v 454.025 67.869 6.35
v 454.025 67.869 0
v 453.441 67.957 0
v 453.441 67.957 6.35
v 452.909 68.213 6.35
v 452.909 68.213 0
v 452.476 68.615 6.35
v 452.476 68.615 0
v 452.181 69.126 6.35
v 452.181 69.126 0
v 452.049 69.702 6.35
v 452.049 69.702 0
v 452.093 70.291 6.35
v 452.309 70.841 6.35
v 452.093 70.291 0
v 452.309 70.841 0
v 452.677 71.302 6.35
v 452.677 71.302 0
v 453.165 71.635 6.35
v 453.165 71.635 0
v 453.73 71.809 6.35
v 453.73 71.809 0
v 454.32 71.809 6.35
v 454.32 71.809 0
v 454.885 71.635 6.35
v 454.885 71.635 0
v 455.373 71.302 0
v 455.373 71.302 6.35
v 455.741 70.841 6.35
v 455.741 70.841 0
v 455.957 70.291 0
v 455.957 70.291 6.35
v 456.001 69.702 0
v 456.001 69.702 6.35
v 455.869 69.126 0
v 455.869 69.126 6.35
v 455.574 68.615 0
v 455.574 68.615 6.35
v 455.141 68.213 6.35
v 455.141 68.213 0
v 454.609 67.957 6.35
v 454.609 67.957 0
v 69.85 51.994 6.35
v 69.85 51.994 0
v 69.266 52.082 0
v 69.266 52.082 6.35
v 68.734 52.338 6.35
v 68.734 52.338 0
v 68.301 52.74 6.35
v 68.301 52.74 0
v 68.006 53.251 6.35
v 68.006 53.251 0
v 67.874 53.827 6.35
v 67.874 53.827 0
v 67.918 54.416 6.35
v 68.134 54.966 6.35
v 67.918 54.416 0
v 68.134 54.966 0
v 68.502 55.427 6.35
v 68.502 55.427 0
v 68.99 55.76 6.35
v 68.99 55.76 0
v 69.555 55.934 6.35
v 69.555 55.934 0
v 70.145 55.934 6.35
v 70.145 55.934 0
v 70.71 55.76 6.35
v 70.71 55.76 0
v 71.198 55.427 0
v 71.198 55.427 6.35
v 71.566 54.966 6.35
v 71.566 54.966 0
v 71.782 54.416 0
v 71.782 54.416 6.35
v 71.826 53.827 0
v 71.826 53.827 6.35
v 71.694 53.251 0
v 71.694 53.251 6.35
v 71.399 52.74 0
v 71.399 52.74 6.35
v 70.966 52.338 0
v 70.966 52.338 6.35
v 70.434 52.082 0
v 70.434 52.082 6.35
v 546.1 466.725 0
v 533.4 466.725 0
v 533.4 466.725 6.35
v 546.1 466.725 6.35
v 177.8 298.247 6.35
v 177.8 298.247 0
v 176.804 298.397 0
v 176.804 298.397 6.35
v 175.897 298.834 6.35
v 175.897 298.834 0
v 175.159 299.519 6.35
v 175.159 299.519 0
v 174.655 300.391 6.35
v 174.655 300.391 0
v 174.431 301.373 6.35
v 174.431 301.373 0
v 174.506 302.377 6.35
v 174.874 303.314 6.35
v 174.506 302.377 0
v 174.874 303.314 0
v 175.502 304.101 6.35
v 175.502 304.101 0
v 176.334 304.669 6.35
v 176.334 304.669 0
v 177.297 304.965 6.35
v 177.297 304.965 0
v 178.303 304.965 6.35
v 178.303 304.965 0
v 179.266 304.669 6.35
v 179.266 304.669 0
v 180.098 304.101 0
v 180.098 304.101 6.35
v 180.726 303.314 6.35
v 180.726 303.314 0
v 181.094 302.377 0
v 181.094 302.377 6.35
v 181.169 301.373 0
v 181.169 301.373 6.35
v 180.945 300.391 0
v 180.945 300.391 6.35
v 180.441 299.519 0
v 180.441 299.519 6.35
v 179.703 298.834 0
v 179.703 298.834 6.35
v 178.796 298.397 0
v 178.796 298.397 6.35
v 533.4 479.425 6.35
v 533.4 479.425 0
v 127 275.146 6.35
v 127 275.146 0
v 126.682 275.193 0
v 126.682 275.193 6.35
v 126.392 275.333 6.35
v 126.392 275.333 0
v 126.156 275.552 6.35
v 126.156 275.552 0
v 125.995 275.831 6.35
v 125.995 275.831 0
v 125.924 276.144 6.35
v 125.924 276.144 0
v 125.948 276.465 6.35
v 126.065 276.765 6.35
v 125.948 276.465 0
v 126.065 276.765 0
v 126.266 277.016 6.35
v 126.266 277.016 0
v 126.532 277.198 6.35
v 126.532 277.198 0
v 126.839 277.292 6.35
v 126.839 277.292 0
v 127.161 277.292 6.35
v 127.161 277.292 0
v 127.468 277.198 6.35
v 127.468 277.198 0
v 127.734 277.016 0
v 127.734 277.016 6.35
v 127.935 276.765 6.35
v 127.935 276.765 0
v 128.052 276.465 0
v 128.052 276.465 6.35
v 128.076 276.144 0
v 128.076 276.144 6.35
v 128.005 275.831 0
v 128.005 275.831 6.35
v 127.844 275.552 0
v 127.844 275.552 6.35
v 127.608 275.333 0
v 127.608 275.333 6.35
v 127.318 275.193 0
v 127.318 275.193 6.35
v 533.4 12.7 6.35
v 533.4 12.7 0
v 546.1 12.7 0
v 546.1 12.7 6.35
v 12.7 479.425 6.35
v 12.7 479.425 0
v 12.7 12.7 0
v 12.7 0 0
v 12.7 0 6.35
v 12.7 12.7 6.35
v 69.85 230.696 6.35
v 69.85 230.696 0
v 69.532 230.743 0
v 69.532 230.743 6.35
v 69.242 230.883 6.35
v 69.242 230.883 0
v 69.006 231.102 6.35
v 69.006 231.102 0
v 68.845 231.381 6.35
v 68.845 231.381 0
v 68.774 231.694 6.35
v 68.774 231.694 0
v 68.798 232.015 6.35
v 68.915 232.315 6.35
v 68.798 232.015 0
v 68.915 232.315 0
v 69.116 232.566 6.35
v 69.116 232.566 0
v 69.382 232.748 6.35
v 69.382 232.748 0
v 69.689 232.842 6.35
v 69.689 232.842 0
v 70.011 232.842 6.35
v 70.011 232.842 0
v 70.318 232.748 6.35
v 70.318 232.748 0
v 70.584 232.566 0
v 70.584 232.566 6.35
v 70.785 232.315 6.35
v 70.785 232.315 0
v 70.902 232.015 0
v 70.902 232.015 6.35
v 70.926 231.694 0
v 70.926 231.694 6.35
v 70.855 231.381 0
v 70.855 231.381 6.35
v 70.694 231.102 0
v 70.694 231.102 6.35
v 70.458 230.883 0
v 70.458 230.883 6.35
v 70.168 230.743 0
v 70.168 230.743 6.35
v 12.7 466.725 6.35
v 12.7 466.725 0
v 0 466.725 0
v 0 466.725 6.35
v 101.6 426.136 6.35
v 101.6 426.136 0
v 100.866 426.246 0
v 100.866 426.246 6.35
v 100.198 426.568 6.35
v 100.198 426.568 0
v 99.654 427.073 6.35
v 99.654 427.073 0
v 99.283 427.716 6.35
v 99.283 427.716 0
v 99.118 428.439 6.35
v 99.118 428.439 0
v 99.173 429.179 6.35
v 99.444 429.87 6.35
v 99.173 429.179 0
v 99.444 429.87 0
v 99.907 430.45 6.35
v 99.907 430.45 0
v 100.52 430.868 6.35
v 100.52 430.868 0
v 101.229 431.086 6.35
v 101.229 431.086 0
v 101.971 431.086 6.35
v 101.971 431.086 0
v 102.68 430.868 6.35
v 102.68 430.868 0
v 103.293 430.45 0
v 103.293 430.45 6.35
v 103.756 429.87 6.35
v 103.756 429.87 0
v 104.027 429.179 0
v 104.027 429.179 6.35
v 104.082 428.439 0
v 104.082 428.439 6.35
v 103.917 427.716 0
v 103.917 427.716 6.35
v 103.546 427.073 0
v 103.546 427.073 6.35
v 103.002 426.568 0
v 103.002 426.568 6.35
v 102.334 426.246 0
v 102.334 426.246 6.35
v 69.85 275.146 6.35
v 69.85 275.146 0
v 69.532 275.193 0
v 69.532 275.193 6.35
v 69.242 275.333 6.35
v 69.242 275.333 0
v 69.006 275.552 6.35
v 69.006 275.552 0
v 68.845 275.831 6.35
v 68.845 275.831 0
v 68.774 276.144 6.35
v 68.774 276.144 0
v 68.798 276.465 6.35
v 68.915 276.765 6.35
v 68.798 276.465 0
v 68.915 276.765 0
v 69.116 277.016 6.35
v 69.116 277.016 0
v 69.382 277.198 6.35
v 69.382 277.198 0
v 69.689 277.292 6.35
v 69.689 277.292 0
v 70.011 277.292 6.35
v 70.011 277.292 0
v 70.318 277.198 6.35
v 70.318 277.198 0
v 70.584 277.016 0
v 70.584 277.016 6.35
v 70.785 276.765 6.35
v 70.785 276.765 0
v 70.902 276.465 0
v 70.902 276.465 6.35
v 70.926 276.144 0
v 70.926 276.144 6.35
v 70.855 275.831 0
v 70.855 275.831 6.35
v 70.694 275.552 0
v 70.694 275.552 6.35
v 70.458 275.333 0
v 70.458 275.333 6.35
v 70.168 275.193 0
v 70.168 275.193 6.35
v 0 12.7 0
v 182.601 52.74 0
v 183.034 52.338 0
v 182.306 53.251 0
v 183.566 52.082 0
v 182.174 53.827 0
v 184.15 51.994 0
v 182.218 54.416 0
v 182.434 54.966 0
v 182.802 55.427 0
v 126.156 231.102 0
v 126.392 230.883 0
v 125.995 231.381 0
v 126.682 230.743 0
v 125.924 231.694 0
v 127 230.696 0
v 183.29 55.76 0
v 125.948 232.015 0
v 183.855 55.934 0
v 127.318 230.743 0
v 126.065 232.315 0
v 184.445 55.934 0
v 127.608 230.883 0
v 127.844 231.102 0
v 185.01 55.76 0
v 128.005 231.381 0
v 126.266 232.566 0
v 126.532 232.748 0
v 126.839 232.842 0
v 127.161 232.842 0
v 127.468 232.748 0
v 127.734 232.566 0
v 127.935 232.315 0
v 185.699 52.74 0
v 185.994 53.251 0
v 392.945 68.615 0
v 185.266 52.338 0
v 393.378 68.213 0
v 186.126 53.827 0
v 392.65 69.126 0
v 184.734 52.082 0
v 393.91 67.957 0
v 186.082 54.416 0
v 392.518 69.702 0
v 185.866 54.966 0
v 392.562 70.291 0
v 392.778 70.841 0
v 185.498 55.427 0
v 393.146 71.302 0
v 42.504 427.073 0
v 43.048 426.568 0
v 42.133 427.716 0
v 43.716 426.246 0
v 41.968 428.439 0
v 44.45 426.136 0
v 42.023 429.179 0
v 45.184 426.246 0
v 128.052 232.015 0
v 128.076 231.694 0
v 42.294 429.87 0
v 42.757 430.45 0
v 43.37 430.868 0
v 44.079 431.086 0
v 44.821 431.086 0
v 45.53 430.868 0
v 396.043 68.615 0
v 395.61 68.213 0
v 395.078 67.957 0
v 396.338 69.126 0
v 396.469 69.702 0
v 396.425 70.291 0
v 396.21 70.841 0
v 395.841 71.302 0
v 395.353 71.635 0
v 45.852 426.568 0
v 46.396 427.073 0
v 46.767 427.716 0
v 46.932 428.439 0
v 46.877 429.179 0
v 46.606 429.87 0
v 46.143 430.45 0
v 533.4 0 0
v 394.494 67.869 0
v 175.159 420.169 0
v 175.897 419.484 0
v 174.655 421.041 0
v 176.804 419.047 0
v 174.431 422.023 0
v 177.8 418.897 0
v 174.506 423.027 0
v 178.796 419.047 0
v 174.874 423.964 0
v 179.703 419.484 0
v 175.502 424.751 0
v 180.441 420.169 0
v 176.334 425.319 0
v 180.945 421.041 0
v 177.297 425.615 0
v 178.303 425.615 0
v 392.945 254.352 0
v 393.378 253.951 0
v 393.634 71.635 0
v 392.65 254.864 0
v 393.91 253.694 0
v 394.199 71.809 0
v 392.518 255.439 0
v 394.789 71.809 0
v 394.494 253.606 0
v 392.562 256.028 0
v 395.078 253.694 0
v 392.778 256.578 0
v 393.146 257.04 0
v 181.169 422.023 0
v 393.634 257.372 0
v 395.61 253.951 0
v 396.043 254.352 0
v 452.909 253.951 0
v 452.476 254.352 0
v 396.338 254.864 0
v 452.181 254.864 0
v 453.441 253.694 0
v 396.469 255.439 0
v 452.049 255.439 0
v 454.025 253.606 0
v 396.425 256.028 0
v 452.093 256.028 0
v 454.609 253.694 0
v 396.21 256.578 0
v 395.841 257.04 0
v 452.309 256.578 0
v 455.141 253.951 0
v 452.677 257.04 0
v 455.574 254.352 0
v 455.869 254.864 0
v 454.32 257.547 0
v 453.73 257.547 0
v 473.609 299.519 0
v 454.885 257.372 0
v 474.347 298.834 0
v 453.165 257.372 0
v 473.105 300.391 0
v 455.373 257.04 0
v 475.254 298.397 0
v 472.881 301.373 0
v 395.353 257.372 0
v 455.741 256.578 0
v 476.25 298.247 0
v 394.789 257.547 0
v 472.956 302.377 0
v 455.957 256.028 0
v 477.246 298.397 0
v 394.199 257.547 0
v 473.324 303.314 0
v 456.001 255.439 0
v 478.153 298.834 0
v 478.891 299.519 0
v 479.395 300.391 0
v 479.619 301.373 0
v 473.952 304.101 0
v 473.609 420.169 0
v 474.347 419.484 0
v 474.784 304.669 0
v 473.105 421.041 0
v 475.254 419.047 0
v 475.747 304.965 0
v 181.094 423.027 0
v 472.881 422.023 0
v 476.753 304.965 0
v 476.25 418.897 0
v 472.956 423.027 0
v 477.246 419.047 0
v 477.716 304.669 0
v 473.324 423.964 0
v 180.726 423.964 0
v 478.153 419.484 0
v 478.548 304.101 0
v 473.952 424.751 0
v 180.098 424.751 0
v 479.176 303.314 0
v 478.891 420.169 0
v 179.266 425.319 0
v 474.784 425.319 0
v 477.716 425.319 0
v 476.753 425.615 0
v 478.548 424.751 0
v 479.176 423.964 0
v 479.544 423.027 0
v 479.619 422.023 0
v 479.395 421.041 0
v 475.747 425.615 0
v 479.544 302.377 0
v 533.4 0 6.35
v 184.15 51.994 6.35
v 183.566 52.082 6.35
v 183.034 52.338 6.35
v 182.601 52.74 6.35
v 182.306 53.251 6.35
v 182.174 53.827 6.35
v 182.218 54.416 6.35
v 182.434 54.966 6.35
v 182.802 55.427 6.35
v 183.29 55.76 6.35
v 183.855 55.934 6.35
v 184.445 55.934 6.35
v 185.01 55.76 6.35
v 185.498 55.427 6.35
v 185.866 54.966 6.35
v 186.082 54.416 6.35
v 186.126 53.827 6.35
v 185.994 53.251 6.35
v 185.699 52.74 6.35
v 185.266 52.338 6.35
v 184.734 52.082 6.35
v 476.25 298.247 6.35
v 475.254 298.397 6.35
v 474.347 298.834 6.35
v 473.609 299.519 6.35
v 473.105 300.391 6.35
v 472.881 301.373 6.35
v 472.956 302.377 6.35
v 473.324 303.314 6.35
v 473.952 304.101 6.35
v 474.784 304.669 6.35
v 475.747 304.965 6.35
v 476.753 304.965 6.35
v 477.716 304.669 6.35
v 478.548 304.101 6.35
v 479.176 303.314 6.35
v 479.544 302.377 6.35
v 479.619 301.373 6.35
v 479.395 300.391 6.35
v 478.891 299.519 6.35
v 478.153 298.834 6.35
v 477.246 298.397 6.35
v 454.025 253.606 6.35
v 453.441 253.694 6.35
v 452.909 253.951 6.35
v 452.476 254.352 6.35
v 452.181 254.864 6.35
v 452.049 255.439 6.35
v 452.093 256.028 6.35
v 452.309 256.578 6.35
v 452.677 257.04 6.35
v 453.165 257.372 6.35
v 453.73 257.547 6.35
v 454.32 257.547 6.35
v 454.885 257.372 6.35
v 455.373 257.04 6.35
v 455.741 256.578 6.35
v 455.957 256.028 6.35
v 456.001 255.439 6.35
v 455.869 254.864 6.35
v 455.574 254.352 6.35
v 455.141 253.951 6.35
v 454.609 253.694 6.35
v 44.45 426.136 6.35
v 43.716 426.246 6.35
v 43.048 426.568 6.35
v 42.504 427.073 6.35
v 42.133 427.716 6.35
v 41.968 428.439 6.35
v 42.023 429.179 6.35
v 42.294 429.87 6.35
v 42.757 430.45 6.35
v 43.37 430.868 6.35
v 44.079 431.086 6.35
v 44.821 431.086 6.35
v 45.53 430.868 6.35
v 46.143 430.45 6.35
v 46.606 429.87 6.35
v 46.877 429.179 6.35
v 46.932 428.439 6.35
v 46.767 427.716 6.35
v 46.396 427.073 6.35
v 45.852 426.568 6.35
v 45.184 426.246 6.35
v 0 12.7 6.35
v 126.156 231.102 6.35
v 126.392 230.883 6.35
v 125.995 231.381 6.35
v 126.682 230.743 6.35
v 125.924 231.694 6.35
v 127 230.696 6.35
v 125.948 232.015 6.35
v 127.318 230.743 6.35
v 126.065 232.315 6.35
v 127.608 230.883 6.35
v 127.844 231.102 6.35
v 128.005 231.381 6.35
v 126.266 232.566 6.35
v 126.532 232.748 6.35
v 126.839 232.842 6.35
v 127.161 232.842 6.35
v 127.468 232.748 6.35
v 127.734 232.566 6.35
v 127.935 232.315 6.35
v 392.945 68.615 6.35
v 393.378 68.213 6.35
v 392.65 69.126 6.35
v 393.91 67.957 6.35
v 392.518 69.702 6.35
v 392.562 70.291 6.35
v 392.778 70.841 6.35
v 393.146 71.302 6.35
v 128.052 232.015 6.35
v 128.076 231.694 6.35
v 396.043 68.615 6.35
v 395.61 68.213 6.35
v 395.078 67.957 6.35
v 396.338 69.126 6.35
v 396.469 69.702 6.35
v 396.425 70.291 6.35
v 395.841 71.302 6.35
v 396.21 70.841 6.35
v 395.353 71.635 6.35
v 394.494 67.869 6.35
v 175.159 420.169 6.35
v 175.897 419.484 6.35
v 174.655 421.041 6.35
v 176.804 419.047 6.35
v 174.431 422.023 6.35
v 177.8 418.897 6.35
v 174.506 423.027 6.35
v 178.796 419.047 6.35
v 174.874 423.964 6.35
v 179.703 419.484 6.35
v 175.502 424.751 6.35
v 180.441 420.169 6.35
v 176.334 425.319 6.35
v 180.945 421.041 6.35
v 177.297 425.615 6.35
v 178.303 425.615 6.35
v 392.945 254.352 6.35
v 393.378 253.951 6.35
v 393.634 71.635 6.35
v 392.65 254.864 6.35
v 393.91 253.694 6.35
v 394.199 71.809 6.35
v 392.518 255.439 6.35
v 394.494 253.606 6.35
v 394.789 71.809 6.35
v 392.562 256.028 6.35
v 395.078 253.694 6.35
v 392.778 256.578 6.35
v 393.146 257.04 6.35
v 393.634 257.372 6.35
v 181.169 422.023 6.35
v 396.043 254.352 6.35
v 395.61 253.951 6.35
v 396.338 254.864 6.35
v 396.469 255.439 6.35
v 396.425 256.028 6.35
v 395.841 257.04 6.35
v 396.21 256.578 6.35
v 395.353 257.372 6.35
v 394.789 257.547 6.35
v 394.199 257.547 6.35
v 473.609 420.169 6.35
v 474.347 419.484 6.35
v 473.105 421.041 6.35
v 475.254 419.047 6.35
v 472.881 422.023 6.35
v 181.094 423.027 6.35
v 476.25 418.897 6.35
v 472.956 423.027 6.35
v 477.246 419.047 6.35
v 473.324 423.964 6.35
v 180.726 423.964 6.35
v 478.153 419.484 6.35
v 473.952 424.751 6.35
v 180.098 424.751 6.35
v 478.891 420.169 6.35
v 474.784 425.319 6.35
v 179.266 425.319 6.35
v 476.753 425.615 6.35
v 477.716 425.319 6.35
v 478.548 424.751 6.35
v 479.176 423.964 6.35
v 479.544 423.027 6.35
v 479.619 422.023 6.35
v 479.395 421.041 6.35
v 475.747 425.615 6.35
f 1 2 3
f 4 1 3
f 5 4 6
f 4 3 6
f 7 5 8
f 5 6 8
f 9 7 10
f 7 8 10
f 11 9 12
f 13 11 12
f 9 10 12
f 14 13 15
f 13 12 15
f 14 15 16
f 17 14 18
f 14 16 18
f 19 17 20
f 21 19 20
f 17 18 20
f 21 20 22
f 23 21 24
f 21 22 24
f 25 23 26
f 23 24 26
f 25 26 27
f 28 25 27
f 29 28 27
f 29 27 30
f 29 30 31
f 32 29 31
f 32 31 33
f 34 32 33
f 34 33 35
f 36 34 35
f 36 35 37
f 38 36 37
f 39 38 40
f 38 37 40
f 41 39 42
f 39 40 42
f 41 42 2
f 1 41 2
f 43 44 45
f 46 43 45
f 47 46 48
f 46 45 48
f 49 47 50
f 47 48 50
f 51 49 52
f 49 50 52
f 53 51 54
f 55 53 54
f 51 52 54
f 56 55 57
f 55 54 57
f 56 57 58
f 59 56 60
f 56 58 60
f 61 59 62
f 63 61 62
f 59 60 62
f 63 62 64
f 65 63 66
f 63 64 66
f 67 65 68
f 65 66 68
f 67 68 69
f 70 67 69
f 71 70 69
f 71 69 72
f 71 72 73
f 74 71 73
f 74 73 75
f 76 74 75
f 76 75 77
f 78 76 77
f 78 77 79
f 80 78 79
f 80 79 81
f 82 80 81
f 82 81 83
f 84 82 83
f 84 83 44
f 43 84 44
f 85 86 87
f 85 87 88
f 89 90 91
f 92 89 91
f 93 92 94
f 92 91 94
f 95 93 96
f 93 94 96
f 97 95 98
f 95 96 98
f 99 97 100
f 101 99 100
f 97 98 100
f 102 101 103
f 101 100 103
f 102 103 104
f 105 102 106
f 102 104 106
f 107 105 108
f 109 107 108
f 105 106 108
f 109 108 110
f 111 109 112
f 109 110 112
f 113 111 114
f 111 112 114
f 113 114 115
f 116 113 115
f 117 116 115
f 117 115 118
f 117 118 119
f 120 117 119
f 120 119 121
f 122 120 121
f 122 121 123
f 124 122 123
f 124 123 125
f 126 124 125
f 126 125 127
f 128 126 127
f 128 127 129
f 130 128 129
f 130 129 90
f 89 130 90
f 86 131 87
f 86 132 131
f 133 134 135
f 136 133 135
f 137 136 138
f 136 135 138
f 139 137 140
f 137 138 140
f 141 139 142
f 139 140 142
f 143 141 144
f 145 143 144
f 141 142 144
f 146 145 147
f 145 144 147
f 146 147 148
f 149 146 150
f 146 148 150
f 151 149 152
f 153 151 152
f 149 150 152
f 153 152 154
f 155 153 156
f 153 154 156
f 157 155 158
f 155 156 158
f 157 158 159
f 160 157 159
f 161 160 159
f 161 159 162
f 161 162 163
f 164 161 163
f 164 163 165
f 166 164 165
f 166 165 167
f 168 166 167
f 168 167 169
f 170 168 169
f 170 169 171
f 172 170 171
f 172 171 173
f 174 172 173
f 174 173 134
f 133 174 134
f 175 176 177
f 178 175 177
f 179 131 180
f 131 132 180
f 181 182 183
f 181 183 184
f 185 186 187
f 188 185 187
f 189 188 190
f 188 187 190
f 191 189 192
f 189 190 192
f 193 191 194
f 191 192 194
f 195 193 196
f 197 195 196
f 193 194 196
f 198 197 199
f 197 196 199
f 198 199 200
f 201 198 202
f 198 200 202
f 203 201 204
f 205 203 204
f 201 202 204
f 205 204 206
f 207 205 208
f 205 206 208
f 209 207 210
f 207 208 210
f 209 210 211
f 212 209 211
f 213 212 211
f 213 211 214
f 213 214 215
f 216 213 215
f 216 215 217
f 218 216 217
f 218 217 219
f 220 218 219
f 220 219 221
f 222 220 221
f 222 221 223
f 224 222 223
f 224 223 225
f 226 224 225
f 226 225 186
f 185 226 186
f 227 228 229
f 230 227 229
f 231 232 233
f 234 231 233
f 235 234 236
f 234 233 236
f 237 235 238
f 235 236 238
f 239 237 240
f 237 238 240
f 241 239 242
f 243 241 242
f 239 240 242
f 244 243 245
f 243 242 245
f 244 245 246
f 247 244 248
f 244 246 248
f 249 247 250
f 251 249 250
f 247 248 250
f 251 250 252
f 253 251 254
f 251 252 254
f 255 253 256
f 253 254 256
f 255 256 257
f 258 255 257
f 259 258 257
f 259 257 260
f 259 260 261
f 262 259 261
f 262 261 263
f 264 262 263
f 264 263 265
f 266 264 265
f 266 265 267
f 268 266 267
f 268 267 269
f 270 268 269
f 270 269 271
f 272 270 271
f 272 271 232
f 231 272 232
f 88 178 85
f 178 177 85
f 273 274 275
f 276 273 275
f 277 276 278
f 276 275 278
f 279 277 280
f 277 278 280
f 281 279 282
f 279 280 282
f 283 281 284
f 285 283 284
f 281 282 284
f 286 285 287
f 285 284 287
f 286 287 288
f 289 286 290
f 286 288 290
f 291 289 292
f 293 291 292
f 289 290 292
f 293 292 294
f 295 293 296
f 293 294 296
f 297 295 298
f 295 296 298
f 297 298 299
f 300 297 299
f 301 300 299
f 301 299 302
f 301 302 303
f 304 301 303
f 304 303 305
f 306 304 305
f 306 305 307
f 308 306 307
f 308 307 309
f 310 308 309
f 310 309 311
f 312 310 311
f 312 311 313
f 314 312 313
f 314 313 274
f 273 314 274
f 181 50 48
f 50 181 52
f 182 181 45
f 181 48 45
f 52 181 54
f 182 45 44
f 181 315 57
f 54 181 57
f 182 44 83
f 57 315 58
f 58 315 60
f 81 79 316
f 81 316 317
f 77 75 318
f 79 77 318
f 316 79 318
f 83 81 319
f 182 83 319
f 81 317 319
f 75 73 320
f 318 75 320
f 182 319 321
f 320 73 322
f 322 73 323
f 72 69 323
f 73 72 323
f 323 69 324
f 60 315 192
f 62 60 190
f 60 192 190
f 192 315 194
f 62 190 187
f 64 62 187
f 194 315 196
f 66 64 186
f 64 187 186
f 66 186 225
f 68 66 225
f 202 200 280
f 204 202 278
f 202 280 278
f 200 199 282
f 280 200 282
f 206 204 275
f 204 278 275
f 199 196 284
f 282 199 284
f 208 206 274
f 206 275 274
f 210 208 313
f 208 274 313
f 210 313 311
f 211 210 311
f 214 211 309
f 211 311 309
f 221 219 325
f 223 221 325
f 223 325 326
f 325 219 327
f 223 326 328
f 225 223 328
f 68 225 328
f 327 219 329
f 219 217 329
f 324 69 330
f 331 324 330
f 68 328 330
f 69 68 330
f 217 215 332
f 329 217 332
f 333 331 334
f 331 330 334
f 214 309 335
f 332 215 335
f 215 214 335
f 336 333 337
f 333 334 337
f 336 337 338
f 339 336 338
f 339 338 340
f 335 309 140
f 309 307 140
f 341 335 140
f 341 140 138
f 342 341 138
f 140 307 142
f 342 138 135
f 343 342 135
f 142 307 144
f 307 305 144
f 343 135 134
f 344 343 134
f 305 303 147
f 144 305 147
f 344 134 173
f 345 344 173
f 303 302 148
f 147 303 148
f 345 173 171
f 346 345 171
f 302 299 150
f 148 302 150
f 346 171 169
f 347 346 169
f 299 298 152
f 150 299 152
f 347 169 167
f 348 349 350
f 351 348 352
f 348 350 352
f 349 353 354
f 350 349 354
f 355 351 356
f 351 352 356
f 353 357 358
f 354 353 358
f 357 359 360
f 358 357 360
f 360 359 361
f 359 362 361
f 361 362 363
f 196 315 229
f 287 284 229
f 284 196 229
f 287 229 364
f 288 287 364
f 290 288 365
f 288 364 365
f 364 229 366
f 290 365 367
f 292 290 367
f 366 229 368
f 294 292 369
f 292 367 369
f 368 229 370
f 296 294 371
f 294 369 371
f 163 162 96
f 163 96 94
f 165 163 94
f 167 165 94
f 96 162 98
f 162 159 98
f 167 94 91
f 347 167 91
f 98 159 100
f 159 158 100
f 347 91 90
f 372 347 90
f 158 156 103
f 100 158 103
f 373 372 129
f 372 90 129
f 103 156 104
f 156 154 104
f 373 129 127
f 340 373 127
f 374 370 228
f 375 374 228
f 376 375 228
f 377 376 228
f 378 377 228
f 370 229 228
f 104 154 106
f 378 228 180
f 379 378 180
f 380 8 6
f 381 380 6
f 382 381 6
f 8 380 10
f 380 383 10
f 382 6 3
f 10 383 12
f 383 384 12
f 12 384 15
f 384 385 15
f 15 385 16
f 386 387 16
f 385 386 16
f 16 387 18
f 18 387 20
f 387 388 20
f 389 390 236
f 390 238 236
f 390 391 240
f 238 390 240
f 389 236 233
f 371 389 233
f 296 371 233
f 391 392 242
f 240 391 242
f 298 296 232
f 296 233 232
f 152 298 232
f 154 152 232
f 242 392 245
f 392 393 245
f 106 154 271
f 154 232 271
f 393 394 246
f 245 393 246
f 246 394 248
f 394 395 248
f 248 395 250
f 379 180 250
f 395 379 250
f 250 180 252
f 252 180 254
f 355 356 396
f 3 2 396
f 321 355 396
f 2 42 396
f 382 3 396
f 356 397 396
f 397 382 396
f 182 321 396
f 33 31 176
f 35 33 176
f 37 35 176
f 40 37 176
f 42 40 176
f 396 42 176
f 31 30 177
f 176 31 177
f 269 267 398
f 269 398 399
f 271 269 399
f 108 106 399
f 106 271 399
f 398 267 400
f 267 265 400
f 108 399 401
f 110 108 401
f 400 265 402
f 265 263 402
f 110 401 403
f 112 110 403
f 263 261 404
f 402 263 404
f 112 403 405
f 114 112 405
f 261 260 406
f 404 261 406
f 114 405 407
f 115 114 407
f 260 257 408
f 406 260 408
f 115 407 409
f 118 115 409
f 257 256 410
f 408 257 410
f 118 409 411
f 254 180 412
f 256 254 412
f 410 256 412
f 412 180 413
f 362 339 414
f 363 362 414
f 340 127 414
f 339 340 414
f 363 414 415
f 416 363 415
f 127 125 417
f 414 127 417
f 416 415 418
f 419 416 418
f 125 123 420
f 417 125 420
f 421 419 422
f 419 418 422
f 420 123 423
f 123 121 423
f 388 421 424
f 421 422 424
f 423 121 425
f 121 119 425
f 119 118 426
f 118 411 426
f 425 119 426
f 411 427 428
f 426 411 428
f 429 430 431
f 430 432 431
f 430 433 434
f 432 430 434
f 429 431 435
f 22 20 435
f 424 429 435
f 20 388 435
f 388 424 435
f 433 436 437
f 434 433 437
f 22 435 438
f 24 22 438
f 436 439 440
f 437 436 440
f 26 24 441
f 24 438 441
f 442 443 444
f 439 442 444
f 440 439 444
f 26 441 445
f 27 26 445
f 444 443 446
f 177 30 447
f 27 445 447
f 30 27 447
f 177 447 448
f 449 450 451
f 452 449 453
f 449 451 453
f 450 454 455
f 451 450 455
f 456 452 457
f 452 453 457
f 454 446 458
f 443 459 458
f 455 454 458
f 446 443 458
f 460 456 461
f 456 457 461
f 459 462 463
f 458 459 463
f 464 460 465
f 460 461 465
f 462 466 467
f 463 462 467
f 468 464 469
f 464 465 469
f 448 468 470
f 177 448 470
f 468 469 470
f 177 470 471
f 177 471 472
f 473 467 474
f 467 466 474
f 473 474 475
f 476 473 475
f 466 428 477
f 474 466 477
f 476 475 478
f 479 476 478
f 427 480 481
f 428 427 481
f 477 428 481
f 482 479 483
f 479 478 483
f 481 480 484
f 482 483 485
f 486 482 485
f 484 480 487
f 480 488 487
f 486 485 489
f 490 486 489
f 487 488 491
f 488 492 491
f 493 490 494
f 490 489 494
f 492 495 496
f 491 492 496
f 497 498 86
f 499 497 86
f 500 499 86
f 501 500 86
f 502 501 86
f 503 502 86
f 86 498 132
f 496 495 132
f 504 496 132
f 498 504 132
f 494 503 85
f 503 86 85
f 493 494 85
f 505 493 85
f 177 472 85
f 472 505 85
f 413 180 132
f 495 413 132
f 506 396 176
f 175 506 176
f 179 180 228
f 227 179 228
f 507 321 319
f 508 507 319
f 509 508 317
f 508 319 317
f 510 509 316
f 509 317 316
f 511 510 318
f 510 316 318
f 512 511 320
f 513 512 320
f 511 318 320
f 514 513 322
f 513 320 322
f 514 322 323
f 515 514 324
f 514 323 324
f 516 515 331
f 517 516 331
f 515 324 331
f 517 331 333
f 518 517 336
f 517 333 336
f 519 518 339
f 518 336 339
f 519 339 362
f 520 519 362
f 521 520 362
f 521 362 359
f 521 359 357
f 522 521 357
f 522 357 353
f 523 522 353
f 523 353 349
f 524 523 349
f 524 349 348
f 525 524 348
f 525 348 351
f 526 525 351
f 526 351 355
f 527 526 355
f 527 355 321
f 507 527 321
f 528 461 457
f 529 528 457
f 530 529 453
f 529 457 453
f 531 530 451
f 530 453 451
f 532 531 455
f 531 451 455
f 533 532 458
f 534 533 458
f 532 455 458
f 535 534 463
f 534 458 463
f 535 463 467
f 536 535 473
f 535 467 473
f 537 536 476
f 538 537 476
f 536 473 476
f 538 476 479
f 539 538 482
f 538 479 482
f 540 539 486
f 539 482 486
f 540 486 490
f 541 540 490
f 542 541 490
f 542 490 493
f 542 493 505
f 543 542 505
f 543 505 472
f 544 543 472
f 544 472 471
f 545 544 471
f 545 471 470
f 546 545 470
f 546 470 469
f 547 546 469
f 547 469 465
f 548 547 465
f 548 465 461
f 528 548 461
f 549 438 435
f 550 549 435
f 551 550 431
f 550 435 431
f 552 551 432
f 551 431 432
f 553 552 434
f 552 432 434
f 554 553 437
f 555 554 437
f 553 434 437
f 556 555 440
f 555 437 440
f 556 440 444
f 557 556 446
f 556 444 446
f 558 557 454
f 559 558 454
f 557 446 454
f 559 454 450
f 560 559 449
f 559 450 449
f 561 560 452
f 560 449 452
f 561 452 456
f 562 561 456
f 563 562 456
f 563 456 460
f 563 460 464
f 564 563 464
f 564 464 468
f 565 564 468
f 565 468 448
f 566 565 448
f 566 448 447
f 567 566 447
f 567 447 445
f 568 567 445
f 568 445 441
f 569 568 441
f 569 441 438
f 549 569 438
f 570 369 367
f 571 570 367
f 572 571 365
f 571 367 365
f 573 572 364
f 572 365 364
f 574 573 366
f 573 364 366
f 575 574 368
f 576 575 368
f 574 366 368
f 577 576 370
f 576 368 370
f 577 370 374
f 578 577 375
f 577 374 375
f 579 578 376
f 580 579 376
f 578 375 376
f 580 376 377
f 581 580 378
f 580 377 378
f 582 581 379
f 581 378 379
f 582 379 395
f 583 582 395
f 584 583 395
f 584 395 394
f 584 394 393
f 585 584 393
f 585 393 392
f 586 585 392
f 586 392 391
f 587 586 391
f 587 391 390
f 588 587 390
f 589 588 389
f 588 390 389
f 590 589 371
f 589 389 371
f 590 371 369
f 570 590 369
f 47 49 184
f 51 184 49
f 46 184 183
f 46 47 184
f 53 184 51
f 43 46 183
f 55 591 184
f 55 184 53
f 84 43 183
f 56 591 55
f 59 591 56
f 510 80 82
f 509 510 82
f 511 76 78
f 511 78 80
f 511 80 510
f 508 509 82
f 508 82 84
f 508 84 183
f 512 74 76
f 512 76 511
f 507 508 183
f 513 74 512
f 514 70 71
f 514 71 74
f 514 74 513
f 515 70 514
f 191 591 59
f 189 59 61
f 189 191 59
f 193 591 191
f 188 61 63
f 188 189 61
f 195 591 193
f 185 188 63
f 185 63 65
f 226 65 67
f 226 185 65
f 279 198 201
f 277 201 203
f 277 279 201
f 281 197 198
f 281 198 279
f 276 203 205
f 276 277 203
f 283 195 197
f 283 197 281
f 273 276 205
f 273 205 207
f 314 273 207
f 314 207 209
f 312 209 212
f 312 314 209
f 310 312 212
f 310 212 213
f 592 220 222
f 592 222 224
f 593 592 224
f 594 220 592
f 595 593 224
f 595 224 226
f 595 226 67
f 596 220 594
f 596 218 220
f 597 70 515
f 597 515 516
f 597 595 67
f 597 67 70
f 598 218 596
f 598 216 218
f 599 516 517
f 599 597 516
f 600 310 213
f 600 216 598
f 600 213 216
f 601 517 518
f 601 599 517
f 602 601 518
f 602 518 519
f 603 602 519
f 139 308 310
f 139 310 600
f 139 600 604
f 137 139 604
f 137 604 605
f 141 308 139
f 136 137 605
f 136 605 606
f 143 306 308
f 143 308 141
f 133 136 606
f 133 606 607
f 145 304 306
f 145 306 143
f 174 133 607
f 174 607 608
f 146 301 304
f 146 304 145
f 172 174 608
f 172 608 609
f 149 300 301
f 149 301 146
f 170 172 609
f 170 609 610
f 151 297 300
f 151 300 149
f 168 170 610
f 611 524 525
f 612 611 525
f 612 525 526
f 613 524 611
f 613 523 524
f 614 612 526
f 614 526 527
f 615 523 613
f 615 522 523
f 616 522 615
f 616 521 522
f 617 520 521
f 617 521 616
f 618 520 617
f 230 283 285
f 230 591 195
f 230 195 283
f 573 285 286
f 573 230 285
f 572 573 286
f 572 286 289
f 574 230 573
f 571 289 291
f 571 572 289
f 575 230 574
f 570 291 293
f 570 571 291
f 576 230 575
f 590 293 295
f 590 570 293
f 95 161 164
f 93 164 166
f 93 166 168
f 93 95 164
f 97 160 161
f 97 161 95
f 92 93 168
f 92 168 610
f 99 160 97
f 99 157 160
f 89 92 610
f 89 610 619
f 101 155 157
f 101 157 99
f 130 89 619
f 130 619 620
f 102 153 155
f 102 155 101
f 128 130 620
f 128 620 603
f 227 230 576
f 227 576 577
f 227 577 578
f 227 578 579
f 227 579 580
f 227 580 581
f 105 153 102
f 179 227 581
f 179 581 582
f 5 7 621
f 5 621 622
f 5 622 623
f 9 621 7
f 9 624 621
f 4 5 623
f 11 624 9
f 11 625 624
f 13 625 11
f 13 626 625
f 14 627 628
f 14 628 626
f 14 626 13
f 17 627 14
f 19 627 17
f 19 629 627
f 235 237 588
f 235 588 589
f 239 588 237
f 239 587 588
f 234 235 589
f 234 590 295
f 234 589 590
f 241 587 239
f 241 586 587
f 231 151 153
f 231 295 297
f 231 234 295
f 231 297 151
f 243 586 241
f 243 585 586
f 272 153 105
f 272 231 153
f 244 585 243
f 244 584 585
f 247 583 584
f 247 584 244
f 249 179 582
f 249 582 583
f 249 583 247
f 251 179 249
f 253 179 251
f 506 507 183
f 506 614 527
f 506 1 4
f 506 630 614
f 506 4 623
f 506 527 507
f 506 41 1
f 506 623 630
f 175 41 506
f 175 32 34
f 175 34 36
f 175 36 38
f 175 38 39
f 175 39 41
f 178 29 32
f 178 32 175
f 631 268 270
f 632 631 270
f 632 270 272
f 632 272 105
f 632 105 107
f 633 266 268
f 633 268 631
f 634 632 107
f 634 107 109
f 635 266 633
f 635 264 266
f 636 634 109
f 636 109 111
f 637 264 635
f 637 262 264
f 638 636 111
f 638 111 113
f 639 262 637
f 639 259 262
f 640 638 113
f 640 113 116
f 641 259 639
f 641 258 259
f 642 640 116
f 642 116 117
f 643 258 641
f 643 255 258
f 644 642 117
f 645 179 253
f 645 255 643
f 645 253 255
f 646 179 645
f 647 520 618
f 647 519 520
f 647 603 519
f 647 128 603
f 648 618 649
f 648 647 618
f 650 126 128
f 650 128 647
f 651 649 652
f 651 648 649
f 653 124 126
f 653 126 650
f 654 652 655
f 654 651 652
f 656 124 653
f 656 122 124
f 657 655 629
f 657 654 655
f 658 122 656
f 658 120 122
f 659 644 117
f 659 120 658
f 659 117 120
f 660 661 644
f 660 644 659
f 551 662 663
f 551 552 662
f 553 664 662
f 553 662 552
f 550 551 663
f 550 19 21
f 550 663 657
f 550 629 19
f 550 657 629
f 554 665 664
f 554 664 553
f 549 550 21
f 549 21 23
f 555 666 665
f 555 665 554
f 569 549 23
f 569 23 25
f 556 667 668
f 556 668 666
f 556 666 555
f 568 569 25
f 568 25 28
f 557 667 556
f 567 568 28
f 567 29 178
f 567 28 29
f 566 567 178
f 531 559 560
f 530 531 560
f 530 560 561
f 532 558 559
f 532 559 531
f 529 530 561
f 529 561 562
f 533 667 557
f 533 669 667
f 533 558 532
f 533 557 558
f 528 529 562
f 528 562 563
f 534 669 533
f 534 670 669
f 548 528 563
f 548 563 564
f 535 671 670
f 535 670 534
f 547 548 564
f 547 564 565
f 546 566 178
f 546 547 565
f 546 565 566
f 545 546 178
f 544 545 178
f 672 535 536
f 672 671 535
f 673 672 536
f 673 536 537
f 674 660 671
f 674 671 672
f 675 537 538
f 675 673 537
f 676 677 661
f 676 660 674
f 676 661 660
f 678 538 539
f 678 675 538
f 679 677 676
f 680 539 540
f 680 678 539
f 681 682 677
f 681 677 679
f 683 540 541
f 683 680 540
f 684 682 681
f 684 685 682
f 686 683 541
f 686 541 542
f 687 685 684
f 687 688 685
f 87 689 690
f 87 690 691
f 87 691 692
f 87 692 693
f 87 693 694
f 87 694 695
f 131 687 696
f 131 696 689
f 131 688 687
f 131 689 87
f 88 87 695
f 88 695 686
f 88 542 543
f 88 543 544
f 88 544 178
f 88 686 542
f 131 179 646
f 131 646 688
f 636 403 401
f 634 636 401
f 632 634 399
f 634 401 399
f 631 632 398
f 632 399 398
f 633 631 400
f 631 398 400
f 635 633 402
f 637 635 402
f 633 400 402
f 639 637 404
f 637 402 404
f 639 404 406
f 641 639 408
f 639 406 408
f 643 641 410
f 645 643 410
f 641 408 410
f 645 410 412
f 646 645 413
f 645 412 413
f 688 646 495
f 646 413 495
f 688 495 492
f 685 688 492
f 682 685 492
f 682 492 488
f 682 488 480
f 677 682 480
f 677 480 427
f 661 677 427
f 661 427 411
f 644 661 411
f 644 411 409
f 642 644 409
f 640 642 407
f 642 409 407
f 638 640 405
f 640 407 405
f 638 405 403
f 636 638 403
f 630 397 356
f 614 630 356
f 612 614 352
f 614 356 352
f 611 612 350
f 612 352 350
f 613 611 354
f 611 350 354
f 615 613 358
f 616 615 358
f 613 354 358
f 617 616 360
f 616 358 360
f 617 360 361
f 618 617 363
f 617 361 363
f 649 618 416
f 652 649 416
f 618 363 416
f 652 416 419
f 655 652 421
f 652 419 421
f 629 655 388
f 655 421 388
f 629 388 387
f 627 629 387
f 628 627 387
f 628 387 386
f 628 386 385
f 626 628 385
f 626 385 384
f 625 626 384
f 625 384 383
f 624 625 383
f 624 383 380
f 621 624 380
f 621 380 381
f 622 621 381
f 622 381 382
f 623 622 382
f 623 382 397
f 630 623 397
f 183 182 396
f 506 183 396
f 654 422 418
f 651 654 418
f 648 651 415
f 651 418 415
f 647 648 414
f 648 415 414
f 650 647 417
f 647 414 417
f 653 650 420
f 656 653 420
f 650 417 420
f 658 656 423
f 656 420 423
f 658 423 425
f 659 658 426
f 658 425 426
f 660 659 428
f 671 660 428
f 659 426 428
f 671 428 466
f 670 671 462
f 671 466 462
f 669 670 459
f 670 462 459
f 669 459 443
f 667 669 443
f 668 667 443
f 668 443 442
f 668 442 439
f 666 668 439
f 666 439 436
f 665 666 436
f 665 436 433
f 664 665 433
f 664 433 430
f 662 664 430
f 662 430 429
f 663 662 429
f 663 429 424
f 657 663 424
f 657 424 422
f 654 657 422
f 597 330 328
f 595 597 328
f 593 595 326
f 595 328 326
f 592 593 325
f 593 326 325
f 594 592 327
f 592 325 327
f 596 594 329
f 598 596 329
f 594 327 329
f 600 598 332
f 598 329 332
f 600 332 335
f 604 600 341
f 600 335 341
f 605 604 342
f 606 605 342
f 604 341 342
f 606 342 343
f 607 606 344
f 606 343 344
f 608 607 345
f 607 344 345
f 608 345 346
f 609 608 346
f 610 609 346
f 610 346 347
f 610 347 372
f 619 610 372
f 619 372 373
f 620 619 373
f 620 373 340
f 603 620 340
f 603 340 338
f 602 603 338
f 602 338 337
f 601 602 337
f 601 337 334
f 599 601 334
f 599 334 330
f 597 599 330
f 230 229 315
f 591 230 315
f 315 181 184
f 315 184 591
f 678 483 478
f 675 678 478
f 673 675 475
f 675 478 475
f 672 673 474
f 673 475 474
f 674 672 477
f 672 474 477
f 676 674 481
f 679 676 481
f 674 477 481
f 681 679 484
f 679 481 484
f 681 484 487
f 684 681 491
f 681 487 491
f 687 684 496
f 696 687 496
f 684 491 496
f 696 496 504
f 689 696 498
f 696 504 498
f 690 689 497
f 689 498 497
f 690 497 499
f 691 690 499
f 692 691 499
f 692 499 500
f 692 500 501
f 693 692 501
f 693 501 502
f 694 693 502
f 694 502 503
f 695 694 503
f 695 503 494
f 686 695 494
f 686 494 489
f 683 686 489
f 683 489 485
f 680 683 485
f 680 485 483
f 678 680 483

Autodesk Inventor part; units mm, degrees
ref_plane "YZ Plane" through (0, 0, 0) normal (1, 0, 0) x (0, 1, 0)
ref_plane "XZ Plane" through (0, 0, 0) normal (0, 1, 0) x (-1, 0, 0)
ref_plane "XY Plane" through (0, 0, 0) normal (0, 0, 1) x (1, 0, 0)
sketch "Sketch1" plane through (0, 0, 0) normal (0, 0, 1) x (1, 0, 0)
  line L0 (0, 0) -> (546.1, 0)
  line L1 (546.1, 0) -> (546.1, 479.425)
  line L2 (546.1, 479.425) -> (0, 479.425)
  line L3 (0, 479.425) -> (0, 0)
  line L4 (0, 0) -> (12.7, 0)
  line L5 (12.7, 0) -> (12.7, 12.7)
  line L6 (12.7, 12.7) -> (0, 12.7)
  line L7 (0, 12.7) -> (0, 0)
  line L8 (0, 479.425) -> (12.7, 479.425)
  line L9 (12.7, 479.425) -> (12.7, 466.725)
  line L10 (12.7, 466.725) -> (0, 466.725)
  line L11 (0, 466.725) -> (0, 479.425)
  line L12 (546.1, 479.425) -> (533.4, 479.425)
  line L13 (533.4, 479.425) -> (533.4, 466.725)
  line L14 (533.4, 466.725) -> (546.1, 466.725)
  line L15 (546.1, 466.725) -> (546.1, 479.425)
  line L16 (546.1, 0) -> (533.4, 0)
  line L17 (533.4, 0) -> (533.4, 12.7)
  line L18 (533.4, 12.7) -> (546.1, 12.7)
  line L19 (546.1, 12.7) -> (546.1, 0)
  dimension "d0" = 479.425
  dimension "d1" = 546.1
  dimension "d2" = 12.7
extrude "Lexan Plate" add sketch "Sketch1" along normal blind 6.35 contours L5 L6 L3 L10 L9 L2 L13 L14 L1 L18 L17 L0
sketch "Sketch2" plane through (0, 0, 6.35) normal (0, 0, 1) x (1, 0, 0)
  line L0 (12.7, 479.425) -> (533.4, 479.425) projected
  line L1 (546.1, 466.725) -> (546.1, 12.7) projected
  line L2 (476.25, 301.625) -> (177.8, 301.625)
  line L3 (177.8, 301.625) -> (177.8, 422.275)
  line L4 (177.8, 422.275) -> (476.25, 422.275)
  line L5 (476.25, 422.275) -> (476.25, 301.625)
  point P0 (0, 0)
  dimension "d7" = 69.85
  dimension "d8" = 57.15
  dimension "d9" = 120.65
  dimension "d10" = 298.45
hole "Inverter Mounting Holes" at (177.8, 422.275, 6.35) at (177.8, 301.625, 6.35) at (476.25, 301.625, 6.35) at (476.25, 422.275, 6.35) direction (0, 0, -1) diameter 6.7564 end through all clearance for "Flat Head Machine Screw (82)" size "1/4" standard "Ansi Unified Screw Threads"
sketch "Sketch3" plane through (0, 0, 6.35) normal (0, 0, 1) x (1, 0, 0)
  line L0 (533.4, 0) -> (12.7, 0) projected
  line L1 (546.1, 466.725) -> (546.1, 12.7) projected
  line L2 (394.4938, 255.5875) -> (454.025, 255.5875)
  line L3 (454.025, 255.5875) -> (454.025, 69.85)
  line L4 (454.025, 69.85) -> (394.4938, 69.85)
  line L5 (394.4938, 69.85) -> (394.4938, 255.5875)
  point P0 (0, 0)
  dimension "d18" = 69.85
  dimension "d19" = 92.075
  dimension "d20" = 59.5312
  dimension "d21" = 185.7375
hole "13.8v Supply Mounting Holes" at (394.4938, 255.5875, 6.35) at (454.025, 255.5875, 6.35) at (454.025, 69.85, 6.35) at (394.4938, 69.85, 6.35) direction (0, 0, -1) diameter 3.9624 end through all thread size "10-32 UNF" class "2B" standard "ANSI Unified Screw Threads"
sketch "Sketch4" plane through (0, 0, 6.35) normal (0, 0, 1) x (1, 0, 0)
  line L0 (0, 12.7) -> (0, 466.725) projected
  line L1 (533.4, 0) -> (12.7, 0) projected
  line L2 (546.1, 466.725) -> (533.4, 466.725) projected
  line L3 (69.85, 53.975) -> (184.15, 53.975)
  point P0 (0, 0)
  dimension "d29" = 69.85
  dimension "d30" = 114.3
  dimension "d31" = 53.975
hole "cRIO Mounting Holes" at (184.15, 53.975, 6.35) at (69.85, 53.975, 6.35) direction (0, 0, -1) diameter 3.9624 end through all thread size "10-32 UNF" class "2B" standard "ANSI Unified Screw Threads"
sketch "Sketch5" plane through (0, 0, 6.35) normal (0, 0, 1) x (1, 0, 0)
  line L0 (0, 12.7) -> (0, 466.725) projected
  line L1 (533.4, 0) -> (12.7, 0) projected
  line L2 (69.85, 276.225) -> (127, 276.225)
  line L3 (127, 276.225) -> (127, 231.775)
  line L4 (127, 231.775) -> (69.85, 231.775)
  line L5 (69.85, 231.775) -> (69.85, 276.225)
  point P0 (0, 0)
  dimension "d40" = 44.45
  dimension "d41" = 57.15
  dimension "d42" = 69.85
  dimension "d43" = 231.775
hole "Sabertooth Mounting Holes" at (127, 276.225, 6.35) at (127, 231.775, 6.35) at (69.85, 231.775, 6.35) at (69.85, 276.225, 6.35) direction (0, 0, -1) diameter 2.159 end through all
sketch "Sketch6" plane through (0, 0, 6.35) normal (0, 0, 1) x (1, 0, 0)
  line L0 (12.7, 479.425) -> (533.4, 479.425) projected
  line L1 (0, 12.7) -> (0, 466.725) projected
  line L2 (546.1, 466.725) -> (533.4, 466.725) projected
  line L3 (44.45, 428.625) -> (101.6, 428.625)
  point P0 (0, 0)
  dimension "d51" = 57.15
  dimension "d52" = 44.45
  dimension "d53" = 50.8
hole "Estop Relay Mounting Holes" at (101.6, 428.625, 6.35) at (44.45, 428.625, 6.35) direction (0, 0, -1) diameter 4.9784 end through all thread size "1/4-20 UNC" class "2B" standard "ANSI Unified Screw Threads"
properties part number "base plate" material "Polycarbonate, Clear"
